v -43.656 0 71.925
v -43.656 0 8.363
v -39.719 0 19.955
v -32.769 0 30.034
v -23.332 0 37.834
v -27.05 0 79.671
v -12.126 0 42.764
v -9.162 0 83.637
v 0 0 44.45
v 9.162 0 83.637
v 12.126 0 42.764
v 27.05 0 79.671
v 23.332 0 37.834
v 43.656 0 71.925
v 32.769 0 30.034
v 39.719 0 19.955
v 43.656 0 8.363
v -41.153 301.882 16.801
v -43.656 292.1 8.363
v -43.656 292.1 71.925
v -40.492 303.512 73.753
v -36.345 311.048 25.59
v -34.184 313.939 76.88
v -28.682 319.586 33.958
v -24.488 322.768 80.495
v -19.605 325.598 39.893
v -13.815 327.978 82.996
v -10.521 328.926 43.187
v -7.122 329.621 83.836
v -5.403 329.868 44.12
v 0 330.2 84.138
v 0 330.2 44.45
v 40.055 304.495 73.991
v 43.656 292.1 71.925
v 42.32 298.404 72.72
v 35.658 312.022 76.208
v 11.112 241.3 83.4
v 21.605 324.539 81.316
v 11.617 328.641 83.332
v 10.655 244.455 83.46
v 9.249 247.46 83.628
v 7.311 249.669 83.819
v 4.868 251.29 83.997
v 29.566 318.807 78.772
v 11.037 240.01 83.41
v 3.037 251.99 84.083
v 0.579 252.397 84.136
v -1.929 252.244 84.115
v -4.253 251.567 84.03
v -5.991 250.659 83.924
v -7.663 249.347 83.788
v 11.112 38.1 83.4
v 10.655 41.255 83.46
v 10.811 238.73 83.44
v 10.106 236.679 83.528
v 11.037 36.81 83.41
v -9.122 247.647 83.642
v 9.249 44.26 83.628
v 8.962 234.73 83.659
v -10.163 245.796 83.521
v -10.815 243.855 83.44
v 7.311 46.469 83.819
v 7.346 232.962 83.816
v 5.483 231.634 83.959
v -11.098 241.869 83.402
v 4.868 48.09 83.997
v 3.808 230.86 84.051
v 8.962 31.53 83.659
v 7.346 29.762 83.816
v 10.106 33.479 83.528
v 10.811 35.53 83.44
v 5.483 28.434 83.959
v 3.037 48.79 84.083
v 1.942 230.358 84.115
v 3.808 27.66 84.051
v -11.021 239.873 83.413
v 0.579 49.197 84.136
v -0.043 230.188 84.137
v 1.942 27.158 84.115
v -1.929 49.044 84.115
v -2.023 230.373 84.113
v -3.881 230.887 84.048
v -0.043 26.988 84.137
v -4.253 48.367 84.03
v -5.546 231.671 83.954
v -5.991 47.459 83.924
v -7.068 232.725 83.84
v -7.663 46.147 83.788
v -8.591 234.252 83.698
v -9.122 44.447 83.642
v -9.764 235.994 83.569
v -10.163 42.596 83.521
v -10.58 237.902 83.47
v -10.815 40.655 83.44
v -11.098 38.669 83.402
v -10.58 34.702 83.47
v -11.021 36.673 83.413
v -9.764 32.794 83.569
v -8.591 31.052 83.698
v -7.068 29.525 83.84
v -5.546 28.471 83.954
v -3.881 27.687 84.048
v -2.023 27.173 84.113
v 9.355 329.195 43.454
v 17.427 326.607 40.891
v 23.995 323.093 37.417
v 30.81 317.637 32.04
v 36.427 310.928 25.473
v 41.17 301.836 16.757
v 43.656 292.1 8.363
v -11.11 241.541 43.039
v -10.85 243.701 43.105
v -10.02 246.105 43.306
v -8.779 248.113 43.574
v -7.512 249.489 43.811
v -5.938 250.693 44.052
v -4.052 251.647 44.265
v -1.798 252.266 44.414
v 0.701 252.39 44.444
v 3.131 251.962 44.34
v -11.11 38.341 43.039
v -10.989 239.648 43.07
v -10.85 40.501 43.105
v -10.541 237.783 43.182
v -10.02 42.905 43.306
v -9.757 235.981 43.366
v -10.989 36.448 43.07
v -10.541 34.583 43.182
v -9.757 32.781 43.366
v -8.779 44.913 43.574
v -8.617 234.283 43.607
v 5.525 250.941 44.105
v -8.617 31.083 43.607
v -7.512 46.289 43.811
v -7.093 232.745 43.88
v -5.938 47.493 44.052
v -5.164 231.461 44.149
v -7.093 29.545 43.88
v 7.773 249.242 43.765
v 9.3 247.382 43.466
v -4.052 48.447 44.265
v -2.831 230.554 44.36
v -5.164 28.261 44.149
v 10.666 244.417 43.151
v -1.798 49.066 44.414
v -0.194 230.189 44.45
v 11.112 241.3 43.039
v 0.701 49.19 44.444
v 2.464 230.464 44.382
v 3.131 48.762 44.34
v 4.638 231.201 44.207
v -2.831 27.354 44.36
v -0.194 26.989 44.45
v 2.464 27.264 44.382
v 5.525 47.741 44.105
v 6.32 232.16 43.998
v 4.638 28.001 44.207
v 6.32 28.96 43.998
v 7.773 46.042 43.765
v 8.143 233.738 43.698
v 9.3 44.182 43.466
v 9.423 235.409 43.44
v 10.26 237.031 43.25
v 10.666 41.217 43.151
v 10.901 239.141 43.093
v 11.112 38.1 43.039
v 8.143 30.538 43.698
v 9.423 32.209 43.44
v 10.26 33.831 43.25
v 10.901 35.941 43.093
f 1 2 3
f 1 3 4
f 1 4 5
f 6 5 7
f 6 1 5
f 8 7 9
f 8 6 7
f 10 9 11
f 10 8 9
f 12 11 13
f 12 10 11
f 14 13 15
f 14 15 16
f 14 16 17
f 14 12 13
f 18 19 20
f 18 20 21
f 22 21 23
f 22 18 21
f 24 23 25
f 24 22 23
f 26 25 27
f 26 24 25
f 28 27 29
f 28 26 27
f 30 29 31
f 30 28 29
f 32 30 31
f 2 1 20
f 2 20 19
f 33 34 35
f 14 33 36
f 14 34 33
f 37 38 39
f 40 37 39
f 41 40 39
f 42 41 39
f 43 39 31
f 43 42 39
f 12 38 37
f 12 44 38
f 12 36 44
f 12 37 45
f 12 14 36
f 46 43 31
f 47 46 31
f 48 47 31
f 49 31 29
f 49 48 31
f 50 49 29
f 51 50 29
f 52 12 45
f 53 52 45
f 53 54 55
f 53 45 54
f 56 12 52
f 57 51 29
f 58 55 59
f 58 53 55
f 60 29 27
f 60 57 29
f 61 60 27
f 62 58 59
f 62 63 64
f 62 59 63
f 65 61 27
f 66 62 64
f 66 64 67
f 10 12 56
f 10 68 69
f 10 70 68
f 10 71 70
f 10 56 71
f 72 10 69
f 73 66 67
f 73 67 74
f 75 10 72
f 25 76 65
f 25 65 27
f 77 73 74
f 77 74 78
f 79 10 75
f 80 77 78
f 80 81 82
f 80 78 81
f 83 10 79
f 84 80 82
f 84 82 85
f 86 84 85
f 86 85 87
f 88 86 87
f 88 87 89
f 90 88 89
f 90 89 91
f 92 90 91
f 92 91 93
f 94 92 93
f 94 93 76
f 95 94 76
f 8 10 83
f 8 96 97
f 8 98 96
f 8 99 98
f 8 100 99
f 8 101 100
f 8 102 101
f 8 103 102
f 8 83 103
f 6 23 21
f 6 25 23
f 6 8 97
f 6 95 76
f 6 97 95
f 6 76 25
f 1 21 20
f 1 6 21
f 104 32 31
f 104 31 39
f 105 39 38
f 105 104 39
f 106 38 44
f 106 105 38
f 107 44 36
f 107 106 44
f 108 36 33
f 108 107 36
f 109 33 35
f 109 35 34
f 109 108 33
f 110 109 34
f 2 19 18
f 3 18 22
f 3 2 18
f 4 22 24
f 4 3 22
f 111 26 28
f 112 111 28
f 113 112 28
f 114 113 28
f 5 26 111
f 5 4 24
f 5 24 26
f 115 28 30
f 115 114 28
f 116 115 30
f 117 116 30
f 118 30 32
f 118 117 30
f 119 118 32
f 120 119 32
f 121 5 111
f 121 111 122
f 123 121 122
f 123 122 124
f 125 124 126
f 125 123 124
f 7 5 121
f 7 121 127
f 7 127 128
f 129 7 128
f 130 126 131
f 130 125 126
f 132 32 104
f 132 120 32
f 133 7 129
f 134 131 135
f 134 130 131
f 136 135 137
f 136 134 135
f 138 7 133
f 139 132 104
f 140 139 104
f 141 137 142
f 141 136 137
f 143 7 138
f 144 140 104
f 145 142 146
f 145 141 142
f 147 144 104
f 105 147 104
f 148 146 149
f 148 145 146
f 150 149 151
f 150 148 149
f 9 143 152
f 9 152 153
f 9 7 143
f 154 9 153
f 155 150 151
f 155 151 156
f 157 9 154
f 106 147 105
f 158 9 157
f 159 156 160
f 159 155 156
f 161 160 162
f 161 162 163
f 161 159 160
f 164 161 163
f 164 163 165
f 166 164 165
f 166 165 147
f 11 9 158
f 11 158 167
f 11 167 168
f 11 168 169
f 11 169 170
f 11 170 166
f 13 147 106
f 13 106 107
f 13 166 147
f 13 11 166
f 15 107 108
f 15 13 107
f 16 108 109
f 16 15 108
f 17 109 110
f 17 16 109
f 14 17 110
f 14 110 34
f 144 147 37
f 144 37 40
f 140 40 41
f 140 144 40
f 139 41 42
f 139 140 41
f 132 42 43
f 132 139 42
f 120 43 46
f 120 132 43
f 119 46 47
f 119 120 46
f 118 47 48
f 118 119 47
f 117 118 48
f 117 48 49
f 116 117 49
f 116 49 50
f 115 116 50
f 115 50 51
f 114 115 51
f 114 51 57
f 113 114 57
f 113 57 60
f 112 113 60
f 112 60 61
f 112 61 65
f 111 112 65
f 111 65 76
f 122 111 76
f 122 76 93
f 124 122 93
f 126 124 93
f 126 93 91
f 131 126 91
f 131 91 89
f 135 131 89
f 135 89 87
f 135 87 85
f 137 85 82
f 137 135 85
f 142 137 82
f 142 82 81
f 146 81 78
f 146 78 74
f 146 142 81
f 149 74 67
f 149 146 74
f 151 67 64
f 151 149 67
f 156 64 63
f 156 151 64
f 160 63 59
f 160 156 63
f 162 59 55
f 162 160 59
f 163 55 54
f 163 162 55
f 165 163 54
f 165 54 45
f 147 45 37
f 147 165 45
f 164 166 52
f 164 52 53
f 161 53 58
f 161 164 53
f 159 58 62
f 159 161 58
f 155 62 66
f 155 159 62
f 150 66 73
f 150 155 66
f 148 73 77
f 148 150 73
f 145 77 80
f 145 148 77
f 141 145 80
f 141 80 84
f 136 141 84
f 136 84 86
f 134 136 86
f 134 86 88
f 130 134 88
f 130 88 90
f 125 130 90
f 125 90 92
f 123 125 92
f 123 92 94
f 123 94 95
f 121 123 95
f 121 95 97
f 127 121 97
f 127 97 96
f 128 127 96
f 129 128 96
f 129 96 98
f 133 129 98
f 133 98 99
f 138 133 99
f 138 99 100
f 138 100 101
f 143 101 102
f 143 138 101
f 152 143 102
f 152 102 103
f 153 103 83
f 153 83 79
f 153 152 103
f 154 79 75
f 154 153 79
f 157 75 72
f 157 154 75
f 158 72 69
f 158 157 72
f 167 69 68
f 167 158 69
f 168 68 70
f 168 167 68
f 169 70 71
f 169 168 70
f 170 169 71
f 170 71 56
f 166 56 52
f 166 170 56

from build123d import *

# Parameters (mm, degrees)
F1_DEPTH = 330.2
F3_DEPTH = 84.1385
F4_R     = 11.1125
F5_DEPTH = 84.1385


with BuildPart() as f1:
    # F0 (on Front) → F1 (new body)
    with BuildSketch(Plane.XZ):
        with BuildLine():
            ThreePointArc((-43.65625, 8.362675), (0, 44.45), (43.65625, 8.362675))
            Line((43.65625, 8.362675), (43.65625, 71.925314))
            ThreePointArc((43.65625, 71.925314), (0, 84.1375), (-43.65625, 71.925314))
            Line((-43.65625, 71.925314), (-43.65625, 8.362675))
        make_face()
    extrude(amount=-F1_DEPTH)

    # F2 (on Top) → F3 (cut, through all)
    with BuildSketch(Plane.XY):
        with BuildLine():
            Line((-43.65625, 330.2), (-43.65625, 292.1))
            ThreePointArc((-43.65625, 292.1), (-28.971875, 319.335547), (0, 330.2))
            Line((0, 330.2), (-43.65625, 330.2))
        make_face()
        with BuildLine():
            Line((43.65625, 330.2), (0, 330.2))
            ThreePointArc((0, 330.2), (28.971875, 319.335547), (43.65625, 292.1))
            Line((43.65625, 292.1), (43.65625, 330.2))
        make_face()
    extrude(amount=F3_DEPTH, mode=Mode.SUBTRACT)

    # F4 (on Top) → F5 (cut, through all)
    with BuildSketch(Plane.XY):
        with Locations((0, 241.3)):
            Circle(F4_R)
        with Locations((0, 38.1)):
            Circle(F4_R)
    extrude(amount=F5_DEPTH, mode=Mode.SUBTRACT)


solid = f1.part
